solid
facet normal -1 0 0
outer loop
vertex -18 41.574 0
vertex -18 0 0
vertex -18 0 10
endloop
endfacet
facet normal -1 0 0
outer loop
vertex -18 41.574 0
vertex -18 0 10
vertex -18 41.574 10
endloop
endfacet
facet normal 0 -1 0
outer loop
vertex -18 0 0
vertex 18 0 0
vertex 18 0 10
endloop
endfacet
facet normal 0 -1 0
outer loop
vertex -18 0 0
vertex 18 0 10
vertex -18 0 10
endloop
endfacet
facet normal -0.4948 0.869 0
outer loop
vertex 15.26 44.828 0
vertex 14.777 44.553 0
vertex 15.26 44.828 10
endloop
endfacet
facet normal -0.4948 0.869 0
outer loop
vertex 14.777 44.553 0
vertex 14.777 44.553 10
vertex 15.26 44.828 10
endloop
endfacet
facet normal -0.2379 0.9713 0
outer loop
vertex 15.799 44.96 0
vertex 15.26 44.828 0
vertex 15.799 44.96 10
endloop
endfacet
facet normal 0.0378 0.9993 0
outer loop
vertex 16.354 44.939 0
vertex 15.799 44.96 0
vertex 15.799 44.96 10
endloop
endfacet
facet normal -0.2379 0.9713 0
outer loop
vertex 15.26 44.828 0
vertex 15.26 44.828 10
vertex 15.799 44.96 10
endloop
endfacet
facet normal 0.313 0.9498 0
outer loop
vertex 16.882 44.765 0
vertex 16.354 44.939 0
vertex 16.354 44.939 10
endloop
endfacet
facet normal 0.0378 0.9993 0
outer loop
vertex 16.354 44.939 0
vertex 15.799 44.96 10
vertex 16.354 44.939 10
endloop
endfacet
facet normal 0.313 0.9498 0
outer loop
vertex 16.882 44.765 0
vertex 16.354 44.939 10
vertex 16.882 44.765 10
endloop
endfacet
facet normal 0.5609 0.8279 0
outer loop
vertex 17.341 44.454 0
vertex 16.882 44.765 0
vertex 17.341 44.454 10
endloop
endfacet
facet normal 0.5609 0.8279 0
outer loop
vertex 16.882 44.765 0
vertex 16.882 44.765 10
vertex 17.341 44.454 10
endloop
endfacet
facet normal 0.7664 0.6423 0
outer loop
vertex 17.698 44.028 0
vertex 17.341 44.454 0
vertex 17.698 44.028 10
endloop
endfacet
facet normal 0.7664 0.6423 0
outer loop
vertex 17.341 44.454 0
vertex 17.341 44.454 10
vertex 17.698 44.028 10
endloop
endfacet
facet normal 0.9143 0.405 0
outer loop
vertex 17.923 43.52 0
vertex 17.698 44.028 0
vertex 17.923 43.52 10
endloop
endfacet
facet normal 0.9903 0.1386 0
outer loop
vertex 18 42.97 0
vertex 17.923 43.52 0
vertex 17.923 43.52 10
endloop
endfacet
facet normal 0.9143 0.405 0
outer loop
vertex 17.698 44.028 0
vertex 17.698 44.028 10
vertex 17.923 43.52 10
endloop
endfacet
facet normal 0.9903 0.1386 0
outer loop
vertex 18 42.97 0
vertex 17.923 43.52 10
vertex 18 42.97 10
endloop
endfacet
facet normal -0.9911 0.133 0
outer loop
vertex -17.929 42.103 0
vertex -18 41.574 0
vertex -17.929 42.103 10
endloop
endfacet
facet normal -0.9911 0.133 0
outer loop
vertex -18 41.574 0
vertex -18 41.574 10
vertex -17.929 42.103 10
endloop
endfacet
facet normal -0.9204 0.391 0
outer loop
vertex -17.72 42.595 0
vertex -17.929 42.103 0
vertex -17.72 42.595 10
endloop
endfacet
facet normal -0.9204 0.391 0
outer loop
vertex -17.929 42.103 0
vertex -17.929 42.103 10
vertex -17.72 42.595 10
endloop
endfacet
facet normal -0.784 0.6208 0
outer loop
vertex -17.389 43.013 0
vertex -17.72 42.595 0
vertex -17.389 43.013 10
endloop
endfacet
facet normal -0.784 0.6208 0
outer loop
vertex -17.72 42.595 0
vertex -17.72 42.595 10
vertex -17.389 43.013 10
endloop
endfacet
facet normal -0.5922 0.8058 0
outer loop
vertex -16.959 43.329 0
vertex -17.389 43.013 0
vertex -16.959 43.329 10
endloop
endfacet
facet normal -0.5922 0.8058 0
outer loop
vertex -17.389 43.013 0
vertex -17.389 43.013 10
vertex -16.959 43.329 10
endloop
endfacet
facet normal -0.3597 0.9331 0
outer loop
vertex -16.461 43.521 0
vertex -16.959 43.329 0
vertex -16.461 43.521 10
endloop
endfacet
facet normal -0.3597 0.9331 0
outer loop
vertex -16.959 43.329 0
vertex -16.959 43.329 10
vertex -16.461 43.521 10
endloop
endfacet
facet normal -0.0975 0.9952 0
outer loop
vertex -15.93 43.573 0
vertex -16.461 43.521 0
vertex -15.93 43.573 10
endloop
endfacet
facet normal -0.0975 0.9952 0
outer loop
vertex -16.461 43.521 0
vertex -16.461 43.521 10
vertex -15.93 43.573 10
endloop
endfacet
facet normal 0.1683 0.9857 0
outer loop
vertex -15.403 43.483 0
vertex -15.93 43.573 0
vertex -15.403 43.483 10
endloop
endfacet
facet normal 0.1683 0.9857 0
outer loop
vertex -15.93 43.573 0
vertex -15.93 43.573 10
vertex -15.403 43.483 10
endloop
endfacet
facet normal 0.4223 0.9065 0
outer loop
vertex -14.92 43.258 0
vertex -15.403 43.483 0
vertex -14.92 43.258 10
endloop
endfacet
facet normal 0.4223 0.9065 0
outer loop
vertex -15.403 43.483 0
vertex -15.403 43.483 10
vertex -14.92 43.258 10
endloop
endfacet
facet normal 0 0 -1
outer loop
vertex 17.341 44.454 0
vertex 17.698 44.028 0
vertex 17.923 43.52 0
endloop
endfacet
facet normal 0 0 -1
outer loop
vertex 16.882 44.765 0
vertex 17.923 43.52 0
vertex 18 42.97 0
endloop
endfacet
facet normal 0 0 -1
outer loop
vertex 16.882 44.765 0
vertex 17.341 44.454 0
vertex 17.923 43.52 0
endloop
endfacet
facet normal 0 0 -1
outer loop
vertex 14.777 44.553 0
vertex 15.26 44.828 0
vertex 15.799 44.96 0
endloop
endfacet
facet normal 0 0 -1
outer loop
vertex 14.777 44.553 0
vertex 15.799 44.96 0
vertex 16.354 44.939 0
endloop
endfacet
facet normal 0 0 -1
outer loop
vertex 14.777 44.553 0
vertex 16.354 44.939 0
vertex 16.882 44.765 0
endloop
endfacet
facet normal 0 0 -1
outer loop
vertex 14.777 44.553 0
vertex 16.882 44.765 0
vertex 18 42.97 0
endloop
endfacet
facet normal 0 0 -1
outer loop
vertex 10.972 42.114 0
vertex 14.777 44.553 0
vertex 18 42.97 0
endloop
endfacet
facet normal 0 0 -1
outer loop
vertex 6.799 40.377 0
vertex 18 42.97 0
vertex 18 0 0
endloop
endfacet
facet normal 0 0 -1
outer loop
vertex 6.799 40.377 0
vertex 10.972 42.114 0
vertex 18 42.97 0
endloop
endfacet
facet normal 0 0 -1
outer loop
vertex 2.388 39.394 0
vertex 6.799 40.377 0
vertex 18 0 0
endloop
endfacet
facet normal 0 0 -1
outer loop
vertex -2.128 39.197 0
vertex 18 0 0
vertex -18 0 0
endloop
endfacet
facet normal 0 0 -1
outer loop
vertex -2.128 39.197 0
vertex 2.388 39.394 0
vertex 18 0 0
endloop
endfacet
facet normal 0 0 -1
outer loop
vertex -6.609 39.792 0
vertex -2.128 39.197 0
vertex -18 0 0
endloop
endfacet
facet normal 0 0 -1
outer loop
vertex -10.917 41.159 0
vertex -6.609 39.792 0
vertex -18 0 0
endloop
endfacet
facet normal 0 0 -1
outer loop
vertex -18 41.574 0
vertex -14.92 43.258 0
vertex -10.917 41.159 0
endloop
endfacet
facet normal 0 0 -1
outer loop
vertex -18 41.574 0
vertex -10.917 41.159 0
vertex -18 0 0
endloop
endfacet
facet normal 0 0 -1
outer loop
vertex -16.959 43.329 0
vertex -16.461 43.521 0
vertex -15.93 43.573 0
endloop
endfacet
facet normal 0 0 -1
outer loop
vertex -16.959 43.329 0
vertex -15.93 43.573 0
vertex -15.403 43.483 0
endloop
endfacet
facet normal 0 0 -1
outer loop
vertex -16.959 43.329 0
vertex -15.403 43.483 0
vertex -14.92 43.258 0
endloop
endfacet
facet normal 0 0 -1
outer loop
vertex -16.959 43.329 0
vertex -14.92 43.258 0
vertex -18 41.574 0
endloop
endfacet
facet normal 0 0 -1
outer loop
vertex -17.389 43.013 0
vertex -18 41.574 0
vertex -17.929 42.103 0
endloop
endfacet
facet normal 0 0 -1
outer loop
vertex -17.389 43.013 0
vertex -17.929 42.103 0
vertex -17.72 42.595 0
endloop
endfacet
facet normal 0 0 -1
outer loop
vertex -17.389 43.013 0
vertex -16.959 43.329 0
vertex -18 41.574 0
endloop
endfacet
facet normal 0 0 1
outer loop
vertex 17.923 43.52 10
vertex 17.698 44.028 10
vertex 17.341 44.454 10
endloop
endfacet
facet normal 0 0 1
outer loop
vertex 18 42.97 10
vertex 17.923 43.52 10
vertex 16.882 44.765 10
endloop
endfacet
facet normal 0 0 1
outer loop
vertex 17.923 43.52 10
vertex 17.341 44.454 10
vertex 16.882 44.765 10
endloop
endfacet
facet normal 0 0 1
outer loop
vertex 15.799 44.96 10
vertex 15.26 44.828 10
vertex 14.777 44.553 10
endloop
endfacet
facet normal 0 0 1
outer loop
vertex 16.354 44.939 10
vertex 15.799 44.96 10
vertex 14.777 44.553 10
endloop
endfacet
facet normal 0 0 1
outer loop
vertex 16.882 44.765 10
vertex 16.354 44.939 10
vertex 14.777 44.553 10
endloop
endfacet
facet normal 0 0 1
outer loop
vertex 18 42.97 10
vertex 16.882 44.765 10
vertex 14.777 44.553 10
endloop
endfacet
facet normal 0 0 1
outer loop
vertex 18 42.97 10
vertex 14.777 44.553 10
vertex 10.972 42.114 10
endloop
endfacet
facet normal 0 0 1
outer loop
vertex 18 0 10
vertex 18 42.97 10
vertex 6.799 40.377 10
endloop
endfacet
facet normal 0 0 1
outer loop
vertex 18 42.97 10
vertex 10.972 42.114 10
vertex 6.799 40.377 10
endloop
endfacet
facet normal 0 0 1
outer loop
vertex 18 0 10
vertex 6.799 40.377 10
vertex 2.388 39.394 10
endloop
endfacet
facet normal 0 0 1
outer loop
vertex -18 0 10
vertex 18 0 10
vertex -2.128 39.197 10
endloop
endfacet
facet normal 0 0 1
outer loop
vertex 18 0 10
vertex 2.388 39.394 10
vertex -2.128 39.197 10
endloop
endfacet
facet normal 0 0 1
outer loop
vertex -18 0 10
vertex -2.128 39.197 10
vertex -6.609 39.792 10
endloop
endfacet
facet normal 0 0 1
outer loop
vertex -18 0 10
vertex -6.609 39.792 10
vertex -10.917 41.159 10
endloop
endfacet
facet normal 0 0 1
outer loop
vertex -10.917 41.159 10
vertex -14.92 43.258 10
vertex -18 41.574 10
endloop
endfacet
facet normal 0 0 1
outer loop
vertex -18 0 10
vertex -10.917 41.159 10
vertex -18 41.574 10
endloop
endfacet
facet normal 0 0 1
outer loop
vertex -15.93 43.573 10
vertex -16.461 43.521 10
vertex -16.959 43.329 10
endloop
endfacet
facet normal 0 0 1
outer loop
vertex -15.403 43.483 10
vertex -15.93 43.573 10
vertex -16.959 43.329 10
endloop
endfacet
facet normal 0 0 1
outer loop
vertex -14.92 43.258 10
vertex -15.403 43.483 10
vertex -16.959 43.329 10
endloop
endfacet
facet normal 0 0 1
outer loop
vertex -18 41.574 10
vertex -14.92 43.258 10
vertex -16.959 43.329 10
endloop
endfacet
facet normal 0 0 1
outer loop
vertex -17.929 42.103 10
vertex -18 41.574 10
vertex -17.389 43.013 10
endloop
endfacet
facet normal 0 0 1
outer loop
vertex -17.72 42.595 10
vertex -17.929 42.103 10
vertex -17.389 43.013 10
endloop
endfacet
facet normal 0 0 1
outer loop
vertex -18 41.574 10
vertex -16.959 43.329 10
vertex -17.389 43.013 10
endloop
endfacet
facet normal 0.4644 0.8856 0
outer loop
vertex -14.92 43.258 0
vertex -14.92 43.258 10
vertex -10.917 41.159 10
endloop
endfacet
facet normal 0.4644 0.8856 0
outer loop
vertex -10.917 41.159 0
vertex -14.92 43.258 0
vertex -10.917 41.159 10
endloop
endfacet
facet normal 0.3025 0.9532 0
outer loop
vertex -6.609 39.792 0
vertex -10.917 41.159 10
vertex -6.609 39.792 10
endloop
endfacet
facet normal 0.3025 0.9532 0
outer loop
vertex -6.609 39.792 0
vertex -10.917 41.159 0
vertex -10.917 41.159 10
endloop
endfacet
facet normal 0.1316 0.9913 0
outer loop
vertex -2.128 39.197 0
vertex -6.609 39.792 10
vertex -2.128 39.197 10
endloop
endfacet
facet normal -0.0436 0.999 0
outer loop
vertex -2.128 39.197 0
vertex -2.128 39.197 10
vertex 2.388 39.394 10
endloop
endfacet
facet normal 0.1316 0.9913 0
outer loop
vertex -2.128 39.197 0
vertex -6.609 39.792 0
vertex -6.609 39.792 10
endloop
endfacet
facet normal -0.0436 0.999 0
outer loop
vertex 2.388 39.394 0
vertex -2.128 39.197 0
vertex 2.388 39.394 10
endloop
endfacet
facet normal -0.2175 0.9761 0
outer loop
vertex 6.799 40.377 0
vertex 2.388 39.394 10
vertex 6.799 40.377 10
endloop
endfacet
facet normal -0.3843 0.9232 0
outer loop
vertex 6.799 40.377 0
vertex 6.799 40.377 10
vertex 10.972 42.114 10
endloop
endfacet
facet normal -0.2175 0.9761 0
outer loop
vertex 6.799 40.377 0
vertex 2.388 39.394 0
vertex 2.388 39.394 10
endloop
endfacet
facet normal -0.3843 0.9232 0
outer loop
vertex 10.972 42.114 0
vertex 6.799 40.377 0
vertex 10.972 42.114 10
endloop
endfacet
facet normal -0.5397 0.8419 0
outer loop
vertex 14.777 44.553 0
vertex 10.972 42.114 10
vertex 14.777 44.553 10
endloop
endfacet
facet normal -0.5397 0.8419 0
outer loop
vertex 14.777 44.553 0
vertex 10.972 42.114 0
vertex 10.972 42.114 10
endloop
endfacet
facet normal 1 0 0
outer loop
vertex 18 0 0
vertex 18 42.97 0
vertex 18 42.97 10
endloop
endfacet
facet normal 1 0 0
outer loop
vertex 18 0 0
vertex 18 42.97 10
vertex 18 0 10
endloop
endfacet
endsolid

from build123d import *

# Parameters (mm, degrees)
ESTRUSIONE_ESTRUSIONE1_DEPTH = 10
RACCORDO1_R                  = 2


with BuildPart() as part:
    # Schizzo1 → Estrusione-Estrusione1 (new body)
    with BuildSketch(Plane.XY):
        with BuildLine():
            Line((-18, 0), (-18, 45.576734941))
            ThreePointArc((-18, 45.576734941), (0.394139103, 39.209366163), (18, 47.511257547))
            Line((18, 47.511257547), (18, 0))
            Line((18, 0), (-18, 0))
        make_face()
    extrude(amount=ESTRUSIONE_ESTRUSIONE1_DEPTH)

    # Raccordo1
    raccordo1_edges = [part.edges().sort_by_distance(p)[0] for p in [
        (-18, 45.576734941, 5),
        (18, 47.511257547, 5),
    ]]
    fillet(raccordo1_edges, radius=RACCORDO1_R)


solid = part.part
